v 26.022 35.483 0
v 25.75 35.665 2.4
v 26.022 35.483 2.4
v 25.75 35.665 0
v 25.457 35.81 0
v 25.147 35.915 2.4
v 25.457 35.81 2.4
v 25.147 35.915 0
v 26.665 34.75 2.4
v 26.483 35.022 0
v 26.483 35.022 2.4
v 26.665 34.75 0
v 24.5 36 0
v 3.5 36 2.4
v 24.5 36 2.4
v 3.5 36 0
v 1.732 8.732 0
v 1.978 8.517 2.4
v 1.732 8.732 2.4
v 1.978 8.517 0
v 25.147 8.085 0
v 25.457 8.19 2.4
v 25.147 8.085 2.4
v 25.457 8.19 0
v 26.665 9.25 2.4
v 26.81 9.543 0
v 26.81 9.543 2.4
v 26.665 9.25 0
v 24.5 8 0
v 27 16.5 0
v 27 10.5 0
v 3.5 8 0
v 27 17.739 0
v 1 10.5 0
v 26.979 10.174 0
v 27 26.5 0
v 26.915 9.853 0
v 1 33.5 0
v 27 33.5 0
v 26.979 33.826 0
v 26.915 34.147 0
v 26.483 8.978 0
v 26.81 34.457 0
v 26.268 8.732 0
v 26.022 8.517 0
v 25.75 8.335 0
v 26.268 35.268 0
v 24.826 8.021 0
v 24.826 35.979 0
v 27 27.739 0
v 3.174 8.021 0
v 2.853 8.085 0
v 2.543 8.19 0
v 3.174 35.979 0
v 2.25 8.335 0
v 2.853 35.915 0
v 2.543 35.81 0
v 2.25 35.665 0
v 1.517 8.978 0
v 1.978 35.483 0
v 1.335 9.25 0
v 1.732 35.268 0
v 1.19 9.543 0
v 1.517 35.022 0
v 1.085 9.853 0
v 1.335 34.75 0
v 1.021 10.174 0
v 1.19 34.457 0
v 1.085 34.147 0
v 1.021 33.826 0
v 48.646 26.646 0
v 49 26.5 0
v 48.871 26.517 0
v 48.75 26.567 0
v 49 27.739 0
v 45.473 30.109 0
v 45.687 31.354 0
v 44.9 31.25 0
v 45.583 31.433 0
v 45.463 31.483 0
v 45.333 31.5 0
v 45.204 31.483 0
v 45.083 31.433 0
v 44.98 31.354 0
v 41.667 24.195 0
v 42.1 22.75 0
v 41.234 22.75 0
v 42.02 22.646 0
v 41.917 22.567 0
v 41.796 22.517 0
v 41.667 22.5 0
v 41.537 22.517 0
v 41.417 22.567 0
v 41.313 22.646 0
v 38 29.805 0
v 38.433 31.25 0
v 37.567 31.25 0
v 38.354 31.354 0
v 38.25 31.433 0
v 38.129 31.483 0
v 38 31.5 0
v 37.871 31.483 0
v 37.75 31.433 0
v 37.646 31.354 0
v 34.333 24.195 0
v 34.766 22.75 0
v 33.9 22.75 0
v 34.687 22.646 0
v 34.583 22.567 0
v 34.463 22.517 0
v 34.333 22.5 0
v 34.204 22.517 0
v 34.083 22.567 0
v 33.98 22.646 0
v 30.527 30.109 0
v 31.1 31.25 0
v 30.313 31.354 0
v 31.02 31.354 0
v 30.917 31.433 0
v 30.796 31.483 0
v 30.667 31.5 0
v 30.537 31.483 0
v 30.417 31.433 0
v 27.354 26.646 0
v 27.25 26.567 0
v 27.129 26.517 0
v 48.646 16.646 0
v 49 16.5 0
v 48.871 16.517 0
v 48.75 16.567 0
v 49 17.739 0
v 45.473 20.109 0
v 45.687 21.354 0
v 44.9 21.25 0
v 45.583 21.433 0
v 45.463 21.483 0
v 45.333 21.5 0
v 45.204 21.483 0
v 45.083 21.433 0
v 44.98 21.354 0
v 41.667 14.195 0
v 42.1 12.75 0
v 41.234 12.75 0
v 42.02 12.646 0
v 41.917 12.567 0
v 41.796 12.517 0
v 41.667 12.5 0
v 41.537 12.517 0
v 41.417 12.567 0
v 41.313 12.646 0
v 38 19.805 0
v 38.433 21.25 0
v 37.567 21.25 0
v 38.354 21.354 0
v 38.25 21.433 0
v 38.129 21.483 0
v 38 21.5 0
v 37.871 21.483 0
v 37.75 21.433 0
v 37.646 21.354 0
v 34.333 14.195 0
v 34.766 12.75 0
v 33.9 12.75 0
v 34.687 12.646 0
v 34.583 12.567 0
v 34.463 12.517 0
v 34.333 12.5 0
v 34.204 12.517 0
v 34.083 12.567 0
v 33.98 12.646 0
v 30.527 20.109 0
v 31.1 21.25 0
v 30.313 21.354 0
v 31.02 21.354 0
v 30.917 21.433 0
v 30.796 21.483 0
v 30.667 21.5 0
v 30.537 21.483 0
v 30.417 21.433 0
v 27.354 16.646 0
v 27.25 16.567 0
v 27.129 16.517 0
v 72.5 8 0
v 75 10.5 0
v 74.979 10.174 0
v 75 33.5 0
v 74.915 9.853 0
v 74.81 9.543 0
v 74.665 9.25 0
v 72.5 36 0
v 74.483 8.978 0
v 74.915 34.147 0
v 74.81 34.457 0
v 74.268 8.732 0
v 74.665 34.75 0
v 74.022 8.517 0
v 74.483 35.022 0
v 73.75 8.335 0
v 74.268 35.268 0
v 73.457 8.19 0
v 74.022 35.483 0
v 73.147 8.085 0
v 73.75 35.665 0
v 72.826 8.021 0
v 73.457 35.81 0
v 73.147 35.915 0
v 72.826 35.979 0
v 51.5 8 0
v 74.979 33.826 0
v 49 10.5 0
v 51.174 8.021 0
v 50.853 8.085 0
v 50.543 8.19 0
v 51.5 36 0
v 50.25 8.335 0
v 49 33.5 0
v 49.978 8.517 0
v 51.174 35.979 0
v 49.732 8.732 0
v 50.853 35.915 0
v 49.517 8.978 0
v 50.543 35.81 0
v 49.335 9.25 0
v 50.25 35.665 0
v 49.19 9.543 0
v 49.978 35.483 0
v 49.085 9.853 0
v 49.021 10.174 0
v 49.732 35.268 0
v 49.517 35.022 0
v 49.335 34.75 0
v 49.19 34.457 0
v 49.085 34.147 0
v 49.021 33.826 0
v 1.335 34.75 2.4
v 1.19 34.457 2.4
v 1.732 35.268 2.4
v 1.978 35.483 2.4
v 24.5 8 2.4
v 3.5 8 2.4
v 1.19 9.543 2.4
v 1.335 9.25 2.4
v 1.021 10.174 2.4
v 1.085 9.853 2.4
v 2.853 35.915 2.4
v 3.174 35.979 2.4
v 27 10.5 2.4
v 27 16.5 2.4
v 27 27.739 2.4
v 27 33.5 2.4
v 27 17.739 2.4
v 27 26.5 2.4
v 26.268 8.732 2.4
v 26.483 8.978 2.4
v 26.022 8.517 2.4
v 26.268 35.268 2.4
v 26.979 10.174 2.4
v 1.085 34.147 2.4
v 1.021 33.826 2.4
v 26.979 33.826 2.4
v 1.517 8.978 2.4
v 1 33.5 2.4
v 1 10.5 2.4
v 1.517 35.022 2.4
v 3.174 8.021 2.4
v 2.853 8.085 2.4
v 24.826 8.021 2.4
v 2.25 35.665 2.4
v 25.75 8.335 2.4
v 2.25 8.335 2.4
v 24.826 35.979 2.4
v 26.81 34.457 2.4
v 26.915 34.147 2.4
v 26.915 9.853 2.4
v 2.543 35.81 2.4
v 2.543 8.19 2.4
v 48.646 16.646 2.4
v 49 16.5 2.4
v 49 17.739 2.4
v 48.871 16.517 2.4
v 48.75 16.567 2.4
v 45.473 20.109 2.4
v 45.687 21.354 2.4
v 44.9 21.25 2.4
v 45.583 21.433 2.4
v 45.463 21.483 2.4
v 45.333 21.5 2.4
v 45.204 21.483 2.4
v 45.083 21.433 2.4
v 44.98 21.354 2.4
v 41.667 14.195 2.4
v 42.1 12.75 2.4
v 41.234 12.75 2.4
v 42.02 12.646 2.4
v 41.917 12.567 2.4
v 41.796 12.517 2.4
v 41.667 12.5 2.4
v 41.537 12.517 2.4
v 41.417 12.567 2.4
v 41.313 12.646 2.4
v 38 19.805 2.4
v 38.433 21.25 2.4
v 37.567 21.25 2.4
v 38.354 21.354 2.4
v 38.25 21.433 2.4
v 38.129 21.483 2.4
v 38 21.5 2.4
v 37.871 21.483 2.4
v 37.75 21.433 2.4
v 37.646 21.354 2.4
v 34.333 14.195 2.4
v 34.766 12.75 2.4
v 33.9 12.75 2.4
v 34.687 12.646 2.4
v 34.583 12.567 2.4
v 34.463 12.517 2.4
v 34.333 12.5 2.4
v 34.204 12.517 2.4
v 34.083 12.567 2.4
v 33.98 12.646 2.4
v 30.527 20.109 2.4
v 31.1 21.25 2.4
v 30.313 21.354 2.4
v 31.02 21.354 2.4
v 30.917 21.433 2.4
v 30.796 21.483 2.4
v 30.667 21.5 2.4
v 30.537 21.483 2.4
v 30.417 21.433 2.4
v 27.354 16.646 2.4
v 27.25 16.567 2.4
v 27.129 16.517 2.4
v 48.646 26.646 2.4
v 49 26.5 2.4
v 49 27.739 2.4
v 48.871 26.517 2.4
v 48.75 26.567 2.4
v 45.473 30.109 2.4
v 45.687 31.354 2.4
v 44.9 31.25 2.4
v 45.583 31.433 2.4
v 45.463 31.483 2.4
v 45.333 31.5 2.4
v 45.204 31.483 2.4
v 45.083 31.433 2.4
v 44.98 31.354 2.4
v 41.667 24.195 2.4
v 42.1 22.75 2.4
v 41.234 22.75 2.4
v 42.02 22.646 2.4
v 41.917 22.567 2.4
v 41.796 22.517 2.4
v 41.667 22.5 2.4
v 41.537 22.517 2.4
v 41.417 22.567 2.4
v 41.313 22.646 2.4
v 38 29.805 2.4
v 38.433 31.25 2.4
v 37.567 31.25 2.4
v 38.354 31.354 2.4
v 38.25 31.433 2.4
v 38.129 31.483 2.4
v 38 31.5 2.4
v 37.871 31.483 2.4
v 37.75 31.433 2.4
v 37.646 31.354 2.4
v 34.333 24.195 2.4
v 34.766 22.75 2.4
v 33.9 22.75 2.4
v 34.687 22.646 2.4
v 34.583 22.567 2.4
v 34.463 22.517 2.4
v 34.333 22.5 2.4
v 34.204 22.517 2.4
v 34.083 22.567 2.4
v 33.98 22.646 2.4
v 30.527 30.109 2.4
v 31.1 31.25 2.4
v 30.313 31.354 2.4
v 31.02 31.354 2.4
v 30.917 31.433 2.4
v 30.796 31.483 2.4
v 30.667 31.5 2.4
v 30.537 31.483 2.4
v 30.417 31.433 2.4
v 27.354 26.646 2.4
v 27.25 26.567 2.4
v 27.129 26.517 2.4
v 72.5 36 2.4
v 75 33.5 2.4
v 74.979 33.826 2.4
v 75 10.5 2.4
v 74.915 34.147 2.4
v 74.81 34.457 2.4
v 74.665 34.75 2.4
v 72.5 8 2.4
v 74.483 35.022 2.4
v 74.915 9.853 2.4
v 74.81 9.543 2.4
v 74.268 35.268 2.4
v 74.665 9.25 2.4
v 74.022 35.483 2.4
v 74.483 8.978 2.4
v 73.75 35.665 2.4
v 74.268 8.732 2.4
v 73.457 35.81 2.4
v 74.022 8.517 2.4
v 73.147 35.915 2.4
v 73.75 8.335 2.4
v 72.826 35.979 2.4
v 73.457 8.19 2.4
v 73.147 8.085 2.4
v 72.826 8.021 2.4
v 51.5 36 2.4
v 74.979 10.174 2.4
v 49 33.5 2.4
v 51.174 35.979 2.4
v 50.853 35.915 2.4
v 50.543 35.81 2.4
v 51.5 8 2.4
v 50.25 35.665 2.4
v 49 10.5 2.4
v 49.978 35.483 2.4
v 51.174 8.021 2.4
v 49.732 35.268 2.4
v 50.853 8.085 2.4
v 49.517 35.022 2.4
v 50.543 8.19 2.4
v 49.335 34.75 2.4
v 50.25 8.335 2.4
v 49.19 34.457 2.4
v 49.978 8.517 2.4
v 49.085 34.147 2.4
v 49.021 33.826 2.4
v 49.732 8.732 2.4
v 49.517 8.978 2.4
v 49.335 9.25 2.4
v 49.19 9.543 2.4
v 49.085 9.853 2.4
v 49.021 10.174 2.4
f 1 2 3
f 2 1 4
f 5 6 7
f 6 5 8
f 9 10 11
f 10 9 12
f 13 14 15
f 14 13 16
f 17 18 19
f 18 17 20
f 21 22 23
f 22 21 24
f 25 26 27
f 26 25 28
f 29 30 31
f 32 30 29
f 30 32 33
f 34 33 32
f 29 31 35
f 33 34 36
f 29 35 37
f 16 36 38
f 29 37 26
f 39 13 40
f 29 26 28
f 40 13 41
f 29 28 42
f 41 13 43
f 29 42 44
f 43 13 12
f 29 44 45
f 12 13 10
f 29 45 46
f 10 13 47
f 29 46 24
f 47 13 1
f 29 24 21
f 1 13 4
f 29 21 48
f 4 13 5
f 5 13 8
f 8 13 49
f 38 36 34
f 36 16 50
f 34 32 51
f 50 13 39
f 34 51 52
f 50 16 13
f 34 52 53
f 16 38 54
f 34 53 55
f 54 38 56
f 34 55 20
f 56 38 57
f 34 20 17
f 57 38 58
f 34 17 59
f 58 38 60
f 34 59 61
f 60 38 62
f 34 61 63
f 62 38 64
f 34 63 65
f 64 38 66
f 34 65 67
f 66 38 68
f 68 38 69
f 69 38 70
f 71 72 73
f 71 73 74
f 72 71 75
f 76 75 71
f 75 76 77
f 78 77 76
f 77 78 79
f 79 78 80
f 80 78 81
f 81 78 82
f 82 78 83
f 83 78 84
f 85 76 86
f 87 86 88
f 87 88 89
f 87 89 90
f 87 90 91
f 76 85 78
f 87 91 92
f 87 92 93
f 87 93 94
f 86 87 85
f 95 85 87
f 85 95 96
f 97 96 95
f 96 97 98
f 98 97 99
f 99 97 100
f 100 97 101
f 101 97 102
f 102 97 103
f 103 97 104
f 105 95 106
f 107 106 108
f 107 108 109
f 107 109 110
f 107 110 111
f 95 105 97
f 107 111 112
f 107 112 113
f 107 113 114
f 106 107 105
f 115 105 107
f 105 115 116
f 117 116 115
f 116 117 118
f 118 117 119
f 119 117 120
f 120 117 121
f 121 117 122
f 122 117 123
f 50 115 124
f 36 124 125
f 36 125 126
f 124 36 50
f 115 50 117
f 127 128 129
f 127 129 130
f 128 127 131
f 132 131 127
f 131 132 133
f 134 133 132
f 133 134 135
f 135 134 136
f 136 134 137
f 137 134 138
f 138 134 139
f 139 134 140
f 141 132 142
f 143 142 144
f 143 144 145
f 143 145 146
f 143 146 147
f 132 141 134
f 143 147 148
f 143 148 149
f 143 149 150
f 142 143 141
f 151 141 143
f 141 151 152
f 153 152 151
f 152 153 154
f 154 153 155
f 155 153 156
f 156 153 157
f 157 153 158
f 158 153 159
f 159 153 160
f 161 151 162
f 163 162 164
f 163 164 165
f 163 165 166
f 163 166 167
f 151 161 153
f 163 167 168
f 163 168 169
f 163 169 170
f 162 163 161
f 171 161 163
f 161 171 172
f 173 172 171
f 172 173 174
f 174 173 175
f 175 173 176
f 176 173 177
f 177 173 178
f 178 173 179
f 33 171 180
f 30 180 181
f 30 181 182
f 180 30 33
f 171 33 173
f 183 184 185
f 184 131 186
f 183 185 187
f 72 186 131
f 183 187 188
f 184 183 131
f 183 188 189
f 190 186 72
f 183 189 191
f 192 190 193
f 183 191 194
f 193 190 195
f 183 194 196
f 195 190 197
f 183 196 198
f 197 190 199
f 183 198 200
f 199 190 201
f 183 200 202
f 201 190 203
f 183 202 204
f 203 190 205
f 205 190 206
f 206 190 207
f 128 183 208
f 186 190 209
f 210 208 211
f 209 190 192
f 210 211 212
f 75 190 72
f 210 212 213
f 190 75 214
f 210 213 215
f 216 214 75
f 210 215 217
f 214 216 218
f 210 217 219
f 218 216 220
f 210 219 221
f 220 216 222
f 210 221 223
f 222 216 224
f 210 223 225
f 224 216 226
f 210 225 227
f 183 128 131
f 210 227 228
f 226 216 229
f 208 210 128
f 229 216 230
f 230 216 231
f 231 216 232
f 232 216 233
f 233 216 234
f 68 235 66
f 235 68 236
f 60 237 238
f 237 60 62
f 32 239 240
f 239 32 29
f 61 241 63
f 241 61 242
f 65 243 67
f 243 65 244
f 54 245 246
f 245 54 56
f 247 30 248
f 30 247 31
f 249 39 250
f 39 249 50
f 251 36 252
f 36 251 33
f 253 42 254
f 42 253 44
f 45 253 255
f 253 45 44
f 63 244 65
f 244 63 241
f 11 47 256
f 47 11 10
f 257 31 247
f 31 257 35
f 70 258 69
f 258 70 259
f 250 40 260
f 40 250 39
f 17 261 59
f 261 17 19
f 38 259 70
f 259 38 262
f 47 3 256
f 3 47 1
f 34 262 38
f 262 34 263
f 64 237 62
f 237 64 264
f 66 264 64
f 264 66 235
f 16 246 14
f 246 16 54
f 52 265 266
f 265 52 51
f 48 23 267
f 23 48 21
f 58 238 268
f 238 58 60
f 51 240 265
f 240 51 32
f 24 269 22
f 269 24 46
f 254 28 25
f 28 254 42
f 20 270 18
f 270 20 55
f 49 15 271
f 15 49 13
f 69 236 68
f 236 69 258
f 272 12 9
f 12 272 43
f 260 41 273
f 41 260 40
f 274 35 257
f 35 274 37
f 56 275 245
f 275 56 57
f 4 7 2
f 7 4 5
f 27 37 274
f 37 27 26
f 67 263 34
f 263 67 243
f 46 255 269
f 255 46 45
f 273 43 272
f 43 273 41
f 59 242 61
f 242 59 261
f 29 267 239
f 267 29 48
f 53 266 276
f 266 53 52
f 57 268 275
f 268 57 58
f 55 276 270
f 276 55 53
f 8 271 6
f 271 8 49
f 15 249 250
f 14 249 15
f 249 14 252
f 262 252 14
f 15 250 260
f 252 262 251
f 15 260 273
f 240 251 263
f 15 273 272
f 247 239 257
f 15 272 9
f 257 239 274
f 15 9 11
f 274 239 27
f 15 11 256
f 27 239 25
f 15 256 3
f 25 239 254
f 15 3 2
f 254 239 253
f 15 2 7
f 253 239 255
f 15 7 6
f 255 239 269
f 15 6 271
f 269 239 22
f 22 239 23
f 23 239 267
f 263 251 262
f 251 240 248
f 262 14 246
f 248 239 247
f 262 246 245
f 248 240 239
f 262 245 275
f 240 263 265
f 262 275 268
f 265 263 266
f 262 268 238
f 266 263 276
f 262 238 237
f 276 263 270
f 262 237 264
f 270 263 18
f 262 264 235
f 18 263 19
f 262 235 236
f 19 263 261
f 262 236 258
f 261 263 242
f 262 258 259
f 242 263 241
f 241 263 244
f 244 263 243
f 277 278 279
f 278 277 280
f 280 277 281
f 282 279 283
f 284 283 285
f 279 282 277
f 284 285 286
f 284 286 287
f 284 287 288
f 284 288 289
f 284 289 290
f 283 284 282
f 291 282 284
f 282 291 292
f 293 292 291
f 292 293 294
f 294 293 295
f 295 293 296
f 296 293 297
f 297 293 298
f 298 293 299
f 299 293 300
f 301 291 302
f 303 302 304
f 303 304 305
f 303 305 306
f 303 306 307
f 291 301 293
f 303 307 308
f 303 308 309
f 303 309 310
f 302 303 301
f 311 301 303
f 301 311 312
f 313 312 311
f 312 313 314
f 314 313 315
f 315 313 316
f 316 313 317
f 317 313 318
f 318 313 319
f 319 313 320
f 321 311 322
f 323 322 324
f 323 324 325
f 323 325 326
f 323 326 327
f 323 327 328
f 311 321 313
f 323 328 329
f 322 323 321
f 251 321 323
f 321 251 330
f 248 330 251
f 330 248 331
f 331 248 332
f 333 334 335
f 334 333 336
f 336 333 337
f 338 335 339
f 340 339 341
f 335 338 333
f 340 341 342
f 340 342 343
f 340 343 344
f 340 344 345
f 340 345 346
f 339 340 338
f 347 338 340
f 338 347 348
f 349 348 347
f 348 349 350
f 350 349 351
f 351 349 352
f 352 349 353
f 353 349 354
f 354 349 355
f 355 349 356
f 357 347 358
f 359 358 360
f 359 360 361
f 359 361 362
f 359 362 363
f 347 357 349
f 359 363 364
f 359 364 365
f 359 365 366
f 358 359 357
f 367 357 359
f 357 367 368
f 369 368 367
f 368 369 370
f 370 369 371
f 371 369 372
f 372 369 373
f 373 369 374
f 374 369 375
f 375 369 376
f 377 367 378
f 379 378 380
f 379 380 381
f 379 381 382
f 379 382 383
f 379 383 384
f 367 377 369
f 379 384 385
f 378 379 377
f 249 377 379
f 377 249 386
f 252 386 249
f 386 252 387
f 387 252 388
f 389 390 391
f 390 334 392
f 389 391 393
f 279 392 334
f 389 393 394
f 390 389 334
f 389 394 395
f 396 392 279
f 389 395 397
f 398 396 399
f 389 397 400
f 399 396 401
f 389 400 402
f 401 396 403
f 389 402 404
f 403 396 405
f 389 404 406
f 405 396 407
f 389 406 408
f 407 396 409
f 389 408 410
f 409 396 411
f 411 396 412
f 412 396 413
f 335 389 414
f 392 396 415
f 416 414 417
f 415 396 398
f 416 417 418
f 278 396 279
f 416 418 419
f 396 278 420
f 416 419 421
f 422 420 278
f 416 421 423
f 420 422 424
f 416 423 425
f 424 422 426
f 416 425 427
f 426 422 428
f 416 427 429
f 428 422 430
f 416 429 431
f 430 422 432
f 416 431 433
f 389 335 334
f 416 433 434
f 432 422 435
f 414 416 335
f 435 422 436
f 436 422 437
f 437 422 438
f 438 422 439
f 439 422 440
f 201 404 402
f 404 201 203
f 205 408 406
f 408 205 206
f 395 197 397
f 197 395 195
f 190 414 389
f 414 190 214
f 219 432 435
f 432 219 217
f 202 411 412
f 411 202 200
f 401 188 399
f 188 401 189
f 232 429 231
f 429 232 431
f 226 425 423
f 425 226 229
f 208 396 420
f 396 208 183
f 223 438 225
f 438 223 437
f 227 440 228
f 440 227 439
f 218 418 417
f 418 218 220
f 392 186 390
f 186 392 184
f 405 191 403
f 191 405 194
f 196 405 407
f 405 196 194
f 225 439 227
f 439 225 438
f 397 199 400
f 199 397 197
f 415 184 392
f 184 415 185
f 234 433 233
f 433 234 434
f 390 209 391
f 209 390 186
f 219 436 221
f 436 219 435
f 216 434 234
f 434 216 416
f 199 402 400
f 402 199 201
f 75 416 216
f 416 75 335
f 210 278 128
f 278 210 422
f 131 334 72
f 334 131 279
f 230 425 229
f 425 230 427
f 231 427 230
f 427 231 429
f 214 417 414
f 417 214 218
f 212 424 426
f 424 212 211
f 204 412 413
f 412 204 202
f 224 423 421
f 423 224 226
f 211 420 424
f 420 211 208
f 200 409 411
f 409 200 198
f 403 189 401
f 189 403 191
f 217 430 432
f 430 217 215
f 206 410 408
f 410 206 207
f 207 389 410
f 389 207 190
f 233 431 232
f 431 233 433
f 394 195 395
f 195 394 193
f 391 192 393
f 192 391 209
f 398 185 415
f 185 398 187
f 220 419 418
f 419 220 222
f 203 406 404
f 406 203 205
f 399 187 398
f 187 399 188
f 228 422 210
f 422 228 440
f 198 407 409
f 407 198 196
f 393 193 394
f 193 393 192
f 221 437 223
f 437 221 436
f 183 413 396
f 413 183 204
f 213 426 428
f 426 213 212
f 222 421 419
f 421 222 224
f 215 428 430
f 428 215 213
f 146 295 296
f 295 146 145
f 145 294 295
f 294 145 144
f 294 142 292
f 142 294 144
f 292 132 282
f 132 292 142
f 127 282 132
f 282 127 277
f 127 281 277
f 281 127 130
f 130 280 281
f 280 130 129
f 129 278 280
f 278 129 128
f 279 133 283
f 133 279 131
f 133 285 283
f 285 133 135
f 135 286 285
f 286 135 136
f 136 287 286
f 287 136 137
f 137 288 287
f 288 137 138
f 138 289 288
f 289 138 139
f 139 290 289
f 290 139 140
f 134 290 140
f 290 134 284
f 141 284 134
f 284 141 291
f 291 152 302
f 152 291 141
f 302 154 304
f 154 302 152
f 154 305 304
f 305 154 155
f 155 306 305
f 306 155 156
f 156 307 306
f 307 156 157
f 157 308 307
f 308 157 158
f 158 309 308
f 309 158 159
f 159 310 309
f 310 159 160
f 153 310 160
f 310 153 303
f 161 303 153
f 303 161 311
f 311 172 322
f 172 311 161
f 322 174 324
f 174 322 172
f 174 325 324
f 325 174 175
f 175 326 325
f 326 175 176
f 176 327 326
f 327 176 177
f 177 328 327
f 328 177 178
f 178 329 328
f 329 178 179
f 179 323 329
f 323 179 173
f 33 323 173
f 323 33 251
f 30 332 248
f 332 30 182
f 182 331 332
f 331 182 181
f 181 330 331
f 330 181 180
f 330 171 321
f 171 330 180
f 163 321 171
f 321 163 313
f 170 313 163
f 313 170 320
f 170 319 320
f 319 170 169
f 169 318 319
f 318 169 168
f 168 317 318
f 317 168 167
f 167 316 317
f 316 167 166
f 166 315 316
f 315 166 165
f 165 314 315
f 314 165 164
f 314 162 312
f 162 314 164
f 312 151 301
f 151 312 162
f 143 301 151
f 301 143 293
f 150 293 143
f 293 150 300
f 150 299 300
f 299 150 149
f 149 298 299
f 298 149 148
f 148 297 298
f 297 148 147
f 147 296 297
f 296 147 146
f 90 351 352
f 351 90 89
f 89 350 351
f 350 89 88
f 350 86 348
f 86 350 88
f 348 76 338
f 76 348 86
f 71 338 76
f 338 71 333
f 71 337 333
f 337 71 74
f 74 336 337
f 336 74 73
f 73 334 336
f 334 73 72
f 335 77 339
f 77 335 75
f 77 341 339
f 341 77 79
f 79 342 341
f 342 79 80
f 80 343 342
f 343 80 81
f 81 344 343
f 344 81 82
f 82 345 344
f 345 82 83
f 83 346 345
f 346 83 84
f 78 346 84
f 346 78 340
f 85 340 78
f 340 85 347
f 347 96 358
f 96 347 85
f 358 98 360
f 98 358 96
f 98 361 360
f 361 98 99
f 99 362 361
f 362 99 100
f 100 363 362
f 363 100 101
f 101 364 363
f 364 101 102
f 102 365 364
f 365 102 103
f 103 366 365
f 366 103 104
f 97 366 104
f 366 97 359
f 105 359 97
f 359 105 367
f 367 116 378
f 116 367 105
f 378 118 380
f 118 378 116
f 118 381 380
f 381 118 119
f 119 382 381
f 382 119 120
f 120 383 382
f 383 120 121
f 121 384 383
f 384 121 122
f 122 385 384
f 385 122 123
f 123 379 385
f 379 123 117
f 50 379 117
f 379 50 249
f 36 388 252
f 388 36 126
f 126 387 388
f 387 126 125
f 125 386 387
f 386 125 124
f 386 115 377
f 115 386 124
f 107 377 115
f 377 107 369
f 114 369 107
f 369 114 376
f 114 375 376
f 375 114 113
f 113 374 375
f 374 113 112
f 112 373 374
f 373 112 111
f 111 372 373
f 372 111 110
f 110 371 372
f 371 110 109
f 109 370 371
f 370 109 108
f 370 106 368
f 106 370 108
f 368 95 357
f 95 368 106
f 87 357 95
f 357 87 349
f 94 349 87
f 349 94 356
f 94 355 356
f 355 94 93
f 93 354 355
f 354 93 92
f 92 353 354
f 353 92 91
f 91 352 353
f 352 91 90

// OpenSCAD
/*
Sample 014: Serpentinen-Filmgelenk — 1,0 mm Bahn
Generated from the FDM Mechanical Sample Library.
Units: millimetres.

Override examples:
  openscad -o custom.stl -D 'view="plate"' -D 'render_fn=64' model.scad
  openscad -o preview.png -D 'view="assembly"' model.scad
*/
use <../../../library/fdm_mechanisms.scad>

render_fn = is_undef(render_fn) ? 48 : render_fn;
view = is_undef(view) ? "plate" : view;
$fn = render_fn;

sample_serpentine_hinge(
    view=view,
    beam_w=1,
    gap=22
);
